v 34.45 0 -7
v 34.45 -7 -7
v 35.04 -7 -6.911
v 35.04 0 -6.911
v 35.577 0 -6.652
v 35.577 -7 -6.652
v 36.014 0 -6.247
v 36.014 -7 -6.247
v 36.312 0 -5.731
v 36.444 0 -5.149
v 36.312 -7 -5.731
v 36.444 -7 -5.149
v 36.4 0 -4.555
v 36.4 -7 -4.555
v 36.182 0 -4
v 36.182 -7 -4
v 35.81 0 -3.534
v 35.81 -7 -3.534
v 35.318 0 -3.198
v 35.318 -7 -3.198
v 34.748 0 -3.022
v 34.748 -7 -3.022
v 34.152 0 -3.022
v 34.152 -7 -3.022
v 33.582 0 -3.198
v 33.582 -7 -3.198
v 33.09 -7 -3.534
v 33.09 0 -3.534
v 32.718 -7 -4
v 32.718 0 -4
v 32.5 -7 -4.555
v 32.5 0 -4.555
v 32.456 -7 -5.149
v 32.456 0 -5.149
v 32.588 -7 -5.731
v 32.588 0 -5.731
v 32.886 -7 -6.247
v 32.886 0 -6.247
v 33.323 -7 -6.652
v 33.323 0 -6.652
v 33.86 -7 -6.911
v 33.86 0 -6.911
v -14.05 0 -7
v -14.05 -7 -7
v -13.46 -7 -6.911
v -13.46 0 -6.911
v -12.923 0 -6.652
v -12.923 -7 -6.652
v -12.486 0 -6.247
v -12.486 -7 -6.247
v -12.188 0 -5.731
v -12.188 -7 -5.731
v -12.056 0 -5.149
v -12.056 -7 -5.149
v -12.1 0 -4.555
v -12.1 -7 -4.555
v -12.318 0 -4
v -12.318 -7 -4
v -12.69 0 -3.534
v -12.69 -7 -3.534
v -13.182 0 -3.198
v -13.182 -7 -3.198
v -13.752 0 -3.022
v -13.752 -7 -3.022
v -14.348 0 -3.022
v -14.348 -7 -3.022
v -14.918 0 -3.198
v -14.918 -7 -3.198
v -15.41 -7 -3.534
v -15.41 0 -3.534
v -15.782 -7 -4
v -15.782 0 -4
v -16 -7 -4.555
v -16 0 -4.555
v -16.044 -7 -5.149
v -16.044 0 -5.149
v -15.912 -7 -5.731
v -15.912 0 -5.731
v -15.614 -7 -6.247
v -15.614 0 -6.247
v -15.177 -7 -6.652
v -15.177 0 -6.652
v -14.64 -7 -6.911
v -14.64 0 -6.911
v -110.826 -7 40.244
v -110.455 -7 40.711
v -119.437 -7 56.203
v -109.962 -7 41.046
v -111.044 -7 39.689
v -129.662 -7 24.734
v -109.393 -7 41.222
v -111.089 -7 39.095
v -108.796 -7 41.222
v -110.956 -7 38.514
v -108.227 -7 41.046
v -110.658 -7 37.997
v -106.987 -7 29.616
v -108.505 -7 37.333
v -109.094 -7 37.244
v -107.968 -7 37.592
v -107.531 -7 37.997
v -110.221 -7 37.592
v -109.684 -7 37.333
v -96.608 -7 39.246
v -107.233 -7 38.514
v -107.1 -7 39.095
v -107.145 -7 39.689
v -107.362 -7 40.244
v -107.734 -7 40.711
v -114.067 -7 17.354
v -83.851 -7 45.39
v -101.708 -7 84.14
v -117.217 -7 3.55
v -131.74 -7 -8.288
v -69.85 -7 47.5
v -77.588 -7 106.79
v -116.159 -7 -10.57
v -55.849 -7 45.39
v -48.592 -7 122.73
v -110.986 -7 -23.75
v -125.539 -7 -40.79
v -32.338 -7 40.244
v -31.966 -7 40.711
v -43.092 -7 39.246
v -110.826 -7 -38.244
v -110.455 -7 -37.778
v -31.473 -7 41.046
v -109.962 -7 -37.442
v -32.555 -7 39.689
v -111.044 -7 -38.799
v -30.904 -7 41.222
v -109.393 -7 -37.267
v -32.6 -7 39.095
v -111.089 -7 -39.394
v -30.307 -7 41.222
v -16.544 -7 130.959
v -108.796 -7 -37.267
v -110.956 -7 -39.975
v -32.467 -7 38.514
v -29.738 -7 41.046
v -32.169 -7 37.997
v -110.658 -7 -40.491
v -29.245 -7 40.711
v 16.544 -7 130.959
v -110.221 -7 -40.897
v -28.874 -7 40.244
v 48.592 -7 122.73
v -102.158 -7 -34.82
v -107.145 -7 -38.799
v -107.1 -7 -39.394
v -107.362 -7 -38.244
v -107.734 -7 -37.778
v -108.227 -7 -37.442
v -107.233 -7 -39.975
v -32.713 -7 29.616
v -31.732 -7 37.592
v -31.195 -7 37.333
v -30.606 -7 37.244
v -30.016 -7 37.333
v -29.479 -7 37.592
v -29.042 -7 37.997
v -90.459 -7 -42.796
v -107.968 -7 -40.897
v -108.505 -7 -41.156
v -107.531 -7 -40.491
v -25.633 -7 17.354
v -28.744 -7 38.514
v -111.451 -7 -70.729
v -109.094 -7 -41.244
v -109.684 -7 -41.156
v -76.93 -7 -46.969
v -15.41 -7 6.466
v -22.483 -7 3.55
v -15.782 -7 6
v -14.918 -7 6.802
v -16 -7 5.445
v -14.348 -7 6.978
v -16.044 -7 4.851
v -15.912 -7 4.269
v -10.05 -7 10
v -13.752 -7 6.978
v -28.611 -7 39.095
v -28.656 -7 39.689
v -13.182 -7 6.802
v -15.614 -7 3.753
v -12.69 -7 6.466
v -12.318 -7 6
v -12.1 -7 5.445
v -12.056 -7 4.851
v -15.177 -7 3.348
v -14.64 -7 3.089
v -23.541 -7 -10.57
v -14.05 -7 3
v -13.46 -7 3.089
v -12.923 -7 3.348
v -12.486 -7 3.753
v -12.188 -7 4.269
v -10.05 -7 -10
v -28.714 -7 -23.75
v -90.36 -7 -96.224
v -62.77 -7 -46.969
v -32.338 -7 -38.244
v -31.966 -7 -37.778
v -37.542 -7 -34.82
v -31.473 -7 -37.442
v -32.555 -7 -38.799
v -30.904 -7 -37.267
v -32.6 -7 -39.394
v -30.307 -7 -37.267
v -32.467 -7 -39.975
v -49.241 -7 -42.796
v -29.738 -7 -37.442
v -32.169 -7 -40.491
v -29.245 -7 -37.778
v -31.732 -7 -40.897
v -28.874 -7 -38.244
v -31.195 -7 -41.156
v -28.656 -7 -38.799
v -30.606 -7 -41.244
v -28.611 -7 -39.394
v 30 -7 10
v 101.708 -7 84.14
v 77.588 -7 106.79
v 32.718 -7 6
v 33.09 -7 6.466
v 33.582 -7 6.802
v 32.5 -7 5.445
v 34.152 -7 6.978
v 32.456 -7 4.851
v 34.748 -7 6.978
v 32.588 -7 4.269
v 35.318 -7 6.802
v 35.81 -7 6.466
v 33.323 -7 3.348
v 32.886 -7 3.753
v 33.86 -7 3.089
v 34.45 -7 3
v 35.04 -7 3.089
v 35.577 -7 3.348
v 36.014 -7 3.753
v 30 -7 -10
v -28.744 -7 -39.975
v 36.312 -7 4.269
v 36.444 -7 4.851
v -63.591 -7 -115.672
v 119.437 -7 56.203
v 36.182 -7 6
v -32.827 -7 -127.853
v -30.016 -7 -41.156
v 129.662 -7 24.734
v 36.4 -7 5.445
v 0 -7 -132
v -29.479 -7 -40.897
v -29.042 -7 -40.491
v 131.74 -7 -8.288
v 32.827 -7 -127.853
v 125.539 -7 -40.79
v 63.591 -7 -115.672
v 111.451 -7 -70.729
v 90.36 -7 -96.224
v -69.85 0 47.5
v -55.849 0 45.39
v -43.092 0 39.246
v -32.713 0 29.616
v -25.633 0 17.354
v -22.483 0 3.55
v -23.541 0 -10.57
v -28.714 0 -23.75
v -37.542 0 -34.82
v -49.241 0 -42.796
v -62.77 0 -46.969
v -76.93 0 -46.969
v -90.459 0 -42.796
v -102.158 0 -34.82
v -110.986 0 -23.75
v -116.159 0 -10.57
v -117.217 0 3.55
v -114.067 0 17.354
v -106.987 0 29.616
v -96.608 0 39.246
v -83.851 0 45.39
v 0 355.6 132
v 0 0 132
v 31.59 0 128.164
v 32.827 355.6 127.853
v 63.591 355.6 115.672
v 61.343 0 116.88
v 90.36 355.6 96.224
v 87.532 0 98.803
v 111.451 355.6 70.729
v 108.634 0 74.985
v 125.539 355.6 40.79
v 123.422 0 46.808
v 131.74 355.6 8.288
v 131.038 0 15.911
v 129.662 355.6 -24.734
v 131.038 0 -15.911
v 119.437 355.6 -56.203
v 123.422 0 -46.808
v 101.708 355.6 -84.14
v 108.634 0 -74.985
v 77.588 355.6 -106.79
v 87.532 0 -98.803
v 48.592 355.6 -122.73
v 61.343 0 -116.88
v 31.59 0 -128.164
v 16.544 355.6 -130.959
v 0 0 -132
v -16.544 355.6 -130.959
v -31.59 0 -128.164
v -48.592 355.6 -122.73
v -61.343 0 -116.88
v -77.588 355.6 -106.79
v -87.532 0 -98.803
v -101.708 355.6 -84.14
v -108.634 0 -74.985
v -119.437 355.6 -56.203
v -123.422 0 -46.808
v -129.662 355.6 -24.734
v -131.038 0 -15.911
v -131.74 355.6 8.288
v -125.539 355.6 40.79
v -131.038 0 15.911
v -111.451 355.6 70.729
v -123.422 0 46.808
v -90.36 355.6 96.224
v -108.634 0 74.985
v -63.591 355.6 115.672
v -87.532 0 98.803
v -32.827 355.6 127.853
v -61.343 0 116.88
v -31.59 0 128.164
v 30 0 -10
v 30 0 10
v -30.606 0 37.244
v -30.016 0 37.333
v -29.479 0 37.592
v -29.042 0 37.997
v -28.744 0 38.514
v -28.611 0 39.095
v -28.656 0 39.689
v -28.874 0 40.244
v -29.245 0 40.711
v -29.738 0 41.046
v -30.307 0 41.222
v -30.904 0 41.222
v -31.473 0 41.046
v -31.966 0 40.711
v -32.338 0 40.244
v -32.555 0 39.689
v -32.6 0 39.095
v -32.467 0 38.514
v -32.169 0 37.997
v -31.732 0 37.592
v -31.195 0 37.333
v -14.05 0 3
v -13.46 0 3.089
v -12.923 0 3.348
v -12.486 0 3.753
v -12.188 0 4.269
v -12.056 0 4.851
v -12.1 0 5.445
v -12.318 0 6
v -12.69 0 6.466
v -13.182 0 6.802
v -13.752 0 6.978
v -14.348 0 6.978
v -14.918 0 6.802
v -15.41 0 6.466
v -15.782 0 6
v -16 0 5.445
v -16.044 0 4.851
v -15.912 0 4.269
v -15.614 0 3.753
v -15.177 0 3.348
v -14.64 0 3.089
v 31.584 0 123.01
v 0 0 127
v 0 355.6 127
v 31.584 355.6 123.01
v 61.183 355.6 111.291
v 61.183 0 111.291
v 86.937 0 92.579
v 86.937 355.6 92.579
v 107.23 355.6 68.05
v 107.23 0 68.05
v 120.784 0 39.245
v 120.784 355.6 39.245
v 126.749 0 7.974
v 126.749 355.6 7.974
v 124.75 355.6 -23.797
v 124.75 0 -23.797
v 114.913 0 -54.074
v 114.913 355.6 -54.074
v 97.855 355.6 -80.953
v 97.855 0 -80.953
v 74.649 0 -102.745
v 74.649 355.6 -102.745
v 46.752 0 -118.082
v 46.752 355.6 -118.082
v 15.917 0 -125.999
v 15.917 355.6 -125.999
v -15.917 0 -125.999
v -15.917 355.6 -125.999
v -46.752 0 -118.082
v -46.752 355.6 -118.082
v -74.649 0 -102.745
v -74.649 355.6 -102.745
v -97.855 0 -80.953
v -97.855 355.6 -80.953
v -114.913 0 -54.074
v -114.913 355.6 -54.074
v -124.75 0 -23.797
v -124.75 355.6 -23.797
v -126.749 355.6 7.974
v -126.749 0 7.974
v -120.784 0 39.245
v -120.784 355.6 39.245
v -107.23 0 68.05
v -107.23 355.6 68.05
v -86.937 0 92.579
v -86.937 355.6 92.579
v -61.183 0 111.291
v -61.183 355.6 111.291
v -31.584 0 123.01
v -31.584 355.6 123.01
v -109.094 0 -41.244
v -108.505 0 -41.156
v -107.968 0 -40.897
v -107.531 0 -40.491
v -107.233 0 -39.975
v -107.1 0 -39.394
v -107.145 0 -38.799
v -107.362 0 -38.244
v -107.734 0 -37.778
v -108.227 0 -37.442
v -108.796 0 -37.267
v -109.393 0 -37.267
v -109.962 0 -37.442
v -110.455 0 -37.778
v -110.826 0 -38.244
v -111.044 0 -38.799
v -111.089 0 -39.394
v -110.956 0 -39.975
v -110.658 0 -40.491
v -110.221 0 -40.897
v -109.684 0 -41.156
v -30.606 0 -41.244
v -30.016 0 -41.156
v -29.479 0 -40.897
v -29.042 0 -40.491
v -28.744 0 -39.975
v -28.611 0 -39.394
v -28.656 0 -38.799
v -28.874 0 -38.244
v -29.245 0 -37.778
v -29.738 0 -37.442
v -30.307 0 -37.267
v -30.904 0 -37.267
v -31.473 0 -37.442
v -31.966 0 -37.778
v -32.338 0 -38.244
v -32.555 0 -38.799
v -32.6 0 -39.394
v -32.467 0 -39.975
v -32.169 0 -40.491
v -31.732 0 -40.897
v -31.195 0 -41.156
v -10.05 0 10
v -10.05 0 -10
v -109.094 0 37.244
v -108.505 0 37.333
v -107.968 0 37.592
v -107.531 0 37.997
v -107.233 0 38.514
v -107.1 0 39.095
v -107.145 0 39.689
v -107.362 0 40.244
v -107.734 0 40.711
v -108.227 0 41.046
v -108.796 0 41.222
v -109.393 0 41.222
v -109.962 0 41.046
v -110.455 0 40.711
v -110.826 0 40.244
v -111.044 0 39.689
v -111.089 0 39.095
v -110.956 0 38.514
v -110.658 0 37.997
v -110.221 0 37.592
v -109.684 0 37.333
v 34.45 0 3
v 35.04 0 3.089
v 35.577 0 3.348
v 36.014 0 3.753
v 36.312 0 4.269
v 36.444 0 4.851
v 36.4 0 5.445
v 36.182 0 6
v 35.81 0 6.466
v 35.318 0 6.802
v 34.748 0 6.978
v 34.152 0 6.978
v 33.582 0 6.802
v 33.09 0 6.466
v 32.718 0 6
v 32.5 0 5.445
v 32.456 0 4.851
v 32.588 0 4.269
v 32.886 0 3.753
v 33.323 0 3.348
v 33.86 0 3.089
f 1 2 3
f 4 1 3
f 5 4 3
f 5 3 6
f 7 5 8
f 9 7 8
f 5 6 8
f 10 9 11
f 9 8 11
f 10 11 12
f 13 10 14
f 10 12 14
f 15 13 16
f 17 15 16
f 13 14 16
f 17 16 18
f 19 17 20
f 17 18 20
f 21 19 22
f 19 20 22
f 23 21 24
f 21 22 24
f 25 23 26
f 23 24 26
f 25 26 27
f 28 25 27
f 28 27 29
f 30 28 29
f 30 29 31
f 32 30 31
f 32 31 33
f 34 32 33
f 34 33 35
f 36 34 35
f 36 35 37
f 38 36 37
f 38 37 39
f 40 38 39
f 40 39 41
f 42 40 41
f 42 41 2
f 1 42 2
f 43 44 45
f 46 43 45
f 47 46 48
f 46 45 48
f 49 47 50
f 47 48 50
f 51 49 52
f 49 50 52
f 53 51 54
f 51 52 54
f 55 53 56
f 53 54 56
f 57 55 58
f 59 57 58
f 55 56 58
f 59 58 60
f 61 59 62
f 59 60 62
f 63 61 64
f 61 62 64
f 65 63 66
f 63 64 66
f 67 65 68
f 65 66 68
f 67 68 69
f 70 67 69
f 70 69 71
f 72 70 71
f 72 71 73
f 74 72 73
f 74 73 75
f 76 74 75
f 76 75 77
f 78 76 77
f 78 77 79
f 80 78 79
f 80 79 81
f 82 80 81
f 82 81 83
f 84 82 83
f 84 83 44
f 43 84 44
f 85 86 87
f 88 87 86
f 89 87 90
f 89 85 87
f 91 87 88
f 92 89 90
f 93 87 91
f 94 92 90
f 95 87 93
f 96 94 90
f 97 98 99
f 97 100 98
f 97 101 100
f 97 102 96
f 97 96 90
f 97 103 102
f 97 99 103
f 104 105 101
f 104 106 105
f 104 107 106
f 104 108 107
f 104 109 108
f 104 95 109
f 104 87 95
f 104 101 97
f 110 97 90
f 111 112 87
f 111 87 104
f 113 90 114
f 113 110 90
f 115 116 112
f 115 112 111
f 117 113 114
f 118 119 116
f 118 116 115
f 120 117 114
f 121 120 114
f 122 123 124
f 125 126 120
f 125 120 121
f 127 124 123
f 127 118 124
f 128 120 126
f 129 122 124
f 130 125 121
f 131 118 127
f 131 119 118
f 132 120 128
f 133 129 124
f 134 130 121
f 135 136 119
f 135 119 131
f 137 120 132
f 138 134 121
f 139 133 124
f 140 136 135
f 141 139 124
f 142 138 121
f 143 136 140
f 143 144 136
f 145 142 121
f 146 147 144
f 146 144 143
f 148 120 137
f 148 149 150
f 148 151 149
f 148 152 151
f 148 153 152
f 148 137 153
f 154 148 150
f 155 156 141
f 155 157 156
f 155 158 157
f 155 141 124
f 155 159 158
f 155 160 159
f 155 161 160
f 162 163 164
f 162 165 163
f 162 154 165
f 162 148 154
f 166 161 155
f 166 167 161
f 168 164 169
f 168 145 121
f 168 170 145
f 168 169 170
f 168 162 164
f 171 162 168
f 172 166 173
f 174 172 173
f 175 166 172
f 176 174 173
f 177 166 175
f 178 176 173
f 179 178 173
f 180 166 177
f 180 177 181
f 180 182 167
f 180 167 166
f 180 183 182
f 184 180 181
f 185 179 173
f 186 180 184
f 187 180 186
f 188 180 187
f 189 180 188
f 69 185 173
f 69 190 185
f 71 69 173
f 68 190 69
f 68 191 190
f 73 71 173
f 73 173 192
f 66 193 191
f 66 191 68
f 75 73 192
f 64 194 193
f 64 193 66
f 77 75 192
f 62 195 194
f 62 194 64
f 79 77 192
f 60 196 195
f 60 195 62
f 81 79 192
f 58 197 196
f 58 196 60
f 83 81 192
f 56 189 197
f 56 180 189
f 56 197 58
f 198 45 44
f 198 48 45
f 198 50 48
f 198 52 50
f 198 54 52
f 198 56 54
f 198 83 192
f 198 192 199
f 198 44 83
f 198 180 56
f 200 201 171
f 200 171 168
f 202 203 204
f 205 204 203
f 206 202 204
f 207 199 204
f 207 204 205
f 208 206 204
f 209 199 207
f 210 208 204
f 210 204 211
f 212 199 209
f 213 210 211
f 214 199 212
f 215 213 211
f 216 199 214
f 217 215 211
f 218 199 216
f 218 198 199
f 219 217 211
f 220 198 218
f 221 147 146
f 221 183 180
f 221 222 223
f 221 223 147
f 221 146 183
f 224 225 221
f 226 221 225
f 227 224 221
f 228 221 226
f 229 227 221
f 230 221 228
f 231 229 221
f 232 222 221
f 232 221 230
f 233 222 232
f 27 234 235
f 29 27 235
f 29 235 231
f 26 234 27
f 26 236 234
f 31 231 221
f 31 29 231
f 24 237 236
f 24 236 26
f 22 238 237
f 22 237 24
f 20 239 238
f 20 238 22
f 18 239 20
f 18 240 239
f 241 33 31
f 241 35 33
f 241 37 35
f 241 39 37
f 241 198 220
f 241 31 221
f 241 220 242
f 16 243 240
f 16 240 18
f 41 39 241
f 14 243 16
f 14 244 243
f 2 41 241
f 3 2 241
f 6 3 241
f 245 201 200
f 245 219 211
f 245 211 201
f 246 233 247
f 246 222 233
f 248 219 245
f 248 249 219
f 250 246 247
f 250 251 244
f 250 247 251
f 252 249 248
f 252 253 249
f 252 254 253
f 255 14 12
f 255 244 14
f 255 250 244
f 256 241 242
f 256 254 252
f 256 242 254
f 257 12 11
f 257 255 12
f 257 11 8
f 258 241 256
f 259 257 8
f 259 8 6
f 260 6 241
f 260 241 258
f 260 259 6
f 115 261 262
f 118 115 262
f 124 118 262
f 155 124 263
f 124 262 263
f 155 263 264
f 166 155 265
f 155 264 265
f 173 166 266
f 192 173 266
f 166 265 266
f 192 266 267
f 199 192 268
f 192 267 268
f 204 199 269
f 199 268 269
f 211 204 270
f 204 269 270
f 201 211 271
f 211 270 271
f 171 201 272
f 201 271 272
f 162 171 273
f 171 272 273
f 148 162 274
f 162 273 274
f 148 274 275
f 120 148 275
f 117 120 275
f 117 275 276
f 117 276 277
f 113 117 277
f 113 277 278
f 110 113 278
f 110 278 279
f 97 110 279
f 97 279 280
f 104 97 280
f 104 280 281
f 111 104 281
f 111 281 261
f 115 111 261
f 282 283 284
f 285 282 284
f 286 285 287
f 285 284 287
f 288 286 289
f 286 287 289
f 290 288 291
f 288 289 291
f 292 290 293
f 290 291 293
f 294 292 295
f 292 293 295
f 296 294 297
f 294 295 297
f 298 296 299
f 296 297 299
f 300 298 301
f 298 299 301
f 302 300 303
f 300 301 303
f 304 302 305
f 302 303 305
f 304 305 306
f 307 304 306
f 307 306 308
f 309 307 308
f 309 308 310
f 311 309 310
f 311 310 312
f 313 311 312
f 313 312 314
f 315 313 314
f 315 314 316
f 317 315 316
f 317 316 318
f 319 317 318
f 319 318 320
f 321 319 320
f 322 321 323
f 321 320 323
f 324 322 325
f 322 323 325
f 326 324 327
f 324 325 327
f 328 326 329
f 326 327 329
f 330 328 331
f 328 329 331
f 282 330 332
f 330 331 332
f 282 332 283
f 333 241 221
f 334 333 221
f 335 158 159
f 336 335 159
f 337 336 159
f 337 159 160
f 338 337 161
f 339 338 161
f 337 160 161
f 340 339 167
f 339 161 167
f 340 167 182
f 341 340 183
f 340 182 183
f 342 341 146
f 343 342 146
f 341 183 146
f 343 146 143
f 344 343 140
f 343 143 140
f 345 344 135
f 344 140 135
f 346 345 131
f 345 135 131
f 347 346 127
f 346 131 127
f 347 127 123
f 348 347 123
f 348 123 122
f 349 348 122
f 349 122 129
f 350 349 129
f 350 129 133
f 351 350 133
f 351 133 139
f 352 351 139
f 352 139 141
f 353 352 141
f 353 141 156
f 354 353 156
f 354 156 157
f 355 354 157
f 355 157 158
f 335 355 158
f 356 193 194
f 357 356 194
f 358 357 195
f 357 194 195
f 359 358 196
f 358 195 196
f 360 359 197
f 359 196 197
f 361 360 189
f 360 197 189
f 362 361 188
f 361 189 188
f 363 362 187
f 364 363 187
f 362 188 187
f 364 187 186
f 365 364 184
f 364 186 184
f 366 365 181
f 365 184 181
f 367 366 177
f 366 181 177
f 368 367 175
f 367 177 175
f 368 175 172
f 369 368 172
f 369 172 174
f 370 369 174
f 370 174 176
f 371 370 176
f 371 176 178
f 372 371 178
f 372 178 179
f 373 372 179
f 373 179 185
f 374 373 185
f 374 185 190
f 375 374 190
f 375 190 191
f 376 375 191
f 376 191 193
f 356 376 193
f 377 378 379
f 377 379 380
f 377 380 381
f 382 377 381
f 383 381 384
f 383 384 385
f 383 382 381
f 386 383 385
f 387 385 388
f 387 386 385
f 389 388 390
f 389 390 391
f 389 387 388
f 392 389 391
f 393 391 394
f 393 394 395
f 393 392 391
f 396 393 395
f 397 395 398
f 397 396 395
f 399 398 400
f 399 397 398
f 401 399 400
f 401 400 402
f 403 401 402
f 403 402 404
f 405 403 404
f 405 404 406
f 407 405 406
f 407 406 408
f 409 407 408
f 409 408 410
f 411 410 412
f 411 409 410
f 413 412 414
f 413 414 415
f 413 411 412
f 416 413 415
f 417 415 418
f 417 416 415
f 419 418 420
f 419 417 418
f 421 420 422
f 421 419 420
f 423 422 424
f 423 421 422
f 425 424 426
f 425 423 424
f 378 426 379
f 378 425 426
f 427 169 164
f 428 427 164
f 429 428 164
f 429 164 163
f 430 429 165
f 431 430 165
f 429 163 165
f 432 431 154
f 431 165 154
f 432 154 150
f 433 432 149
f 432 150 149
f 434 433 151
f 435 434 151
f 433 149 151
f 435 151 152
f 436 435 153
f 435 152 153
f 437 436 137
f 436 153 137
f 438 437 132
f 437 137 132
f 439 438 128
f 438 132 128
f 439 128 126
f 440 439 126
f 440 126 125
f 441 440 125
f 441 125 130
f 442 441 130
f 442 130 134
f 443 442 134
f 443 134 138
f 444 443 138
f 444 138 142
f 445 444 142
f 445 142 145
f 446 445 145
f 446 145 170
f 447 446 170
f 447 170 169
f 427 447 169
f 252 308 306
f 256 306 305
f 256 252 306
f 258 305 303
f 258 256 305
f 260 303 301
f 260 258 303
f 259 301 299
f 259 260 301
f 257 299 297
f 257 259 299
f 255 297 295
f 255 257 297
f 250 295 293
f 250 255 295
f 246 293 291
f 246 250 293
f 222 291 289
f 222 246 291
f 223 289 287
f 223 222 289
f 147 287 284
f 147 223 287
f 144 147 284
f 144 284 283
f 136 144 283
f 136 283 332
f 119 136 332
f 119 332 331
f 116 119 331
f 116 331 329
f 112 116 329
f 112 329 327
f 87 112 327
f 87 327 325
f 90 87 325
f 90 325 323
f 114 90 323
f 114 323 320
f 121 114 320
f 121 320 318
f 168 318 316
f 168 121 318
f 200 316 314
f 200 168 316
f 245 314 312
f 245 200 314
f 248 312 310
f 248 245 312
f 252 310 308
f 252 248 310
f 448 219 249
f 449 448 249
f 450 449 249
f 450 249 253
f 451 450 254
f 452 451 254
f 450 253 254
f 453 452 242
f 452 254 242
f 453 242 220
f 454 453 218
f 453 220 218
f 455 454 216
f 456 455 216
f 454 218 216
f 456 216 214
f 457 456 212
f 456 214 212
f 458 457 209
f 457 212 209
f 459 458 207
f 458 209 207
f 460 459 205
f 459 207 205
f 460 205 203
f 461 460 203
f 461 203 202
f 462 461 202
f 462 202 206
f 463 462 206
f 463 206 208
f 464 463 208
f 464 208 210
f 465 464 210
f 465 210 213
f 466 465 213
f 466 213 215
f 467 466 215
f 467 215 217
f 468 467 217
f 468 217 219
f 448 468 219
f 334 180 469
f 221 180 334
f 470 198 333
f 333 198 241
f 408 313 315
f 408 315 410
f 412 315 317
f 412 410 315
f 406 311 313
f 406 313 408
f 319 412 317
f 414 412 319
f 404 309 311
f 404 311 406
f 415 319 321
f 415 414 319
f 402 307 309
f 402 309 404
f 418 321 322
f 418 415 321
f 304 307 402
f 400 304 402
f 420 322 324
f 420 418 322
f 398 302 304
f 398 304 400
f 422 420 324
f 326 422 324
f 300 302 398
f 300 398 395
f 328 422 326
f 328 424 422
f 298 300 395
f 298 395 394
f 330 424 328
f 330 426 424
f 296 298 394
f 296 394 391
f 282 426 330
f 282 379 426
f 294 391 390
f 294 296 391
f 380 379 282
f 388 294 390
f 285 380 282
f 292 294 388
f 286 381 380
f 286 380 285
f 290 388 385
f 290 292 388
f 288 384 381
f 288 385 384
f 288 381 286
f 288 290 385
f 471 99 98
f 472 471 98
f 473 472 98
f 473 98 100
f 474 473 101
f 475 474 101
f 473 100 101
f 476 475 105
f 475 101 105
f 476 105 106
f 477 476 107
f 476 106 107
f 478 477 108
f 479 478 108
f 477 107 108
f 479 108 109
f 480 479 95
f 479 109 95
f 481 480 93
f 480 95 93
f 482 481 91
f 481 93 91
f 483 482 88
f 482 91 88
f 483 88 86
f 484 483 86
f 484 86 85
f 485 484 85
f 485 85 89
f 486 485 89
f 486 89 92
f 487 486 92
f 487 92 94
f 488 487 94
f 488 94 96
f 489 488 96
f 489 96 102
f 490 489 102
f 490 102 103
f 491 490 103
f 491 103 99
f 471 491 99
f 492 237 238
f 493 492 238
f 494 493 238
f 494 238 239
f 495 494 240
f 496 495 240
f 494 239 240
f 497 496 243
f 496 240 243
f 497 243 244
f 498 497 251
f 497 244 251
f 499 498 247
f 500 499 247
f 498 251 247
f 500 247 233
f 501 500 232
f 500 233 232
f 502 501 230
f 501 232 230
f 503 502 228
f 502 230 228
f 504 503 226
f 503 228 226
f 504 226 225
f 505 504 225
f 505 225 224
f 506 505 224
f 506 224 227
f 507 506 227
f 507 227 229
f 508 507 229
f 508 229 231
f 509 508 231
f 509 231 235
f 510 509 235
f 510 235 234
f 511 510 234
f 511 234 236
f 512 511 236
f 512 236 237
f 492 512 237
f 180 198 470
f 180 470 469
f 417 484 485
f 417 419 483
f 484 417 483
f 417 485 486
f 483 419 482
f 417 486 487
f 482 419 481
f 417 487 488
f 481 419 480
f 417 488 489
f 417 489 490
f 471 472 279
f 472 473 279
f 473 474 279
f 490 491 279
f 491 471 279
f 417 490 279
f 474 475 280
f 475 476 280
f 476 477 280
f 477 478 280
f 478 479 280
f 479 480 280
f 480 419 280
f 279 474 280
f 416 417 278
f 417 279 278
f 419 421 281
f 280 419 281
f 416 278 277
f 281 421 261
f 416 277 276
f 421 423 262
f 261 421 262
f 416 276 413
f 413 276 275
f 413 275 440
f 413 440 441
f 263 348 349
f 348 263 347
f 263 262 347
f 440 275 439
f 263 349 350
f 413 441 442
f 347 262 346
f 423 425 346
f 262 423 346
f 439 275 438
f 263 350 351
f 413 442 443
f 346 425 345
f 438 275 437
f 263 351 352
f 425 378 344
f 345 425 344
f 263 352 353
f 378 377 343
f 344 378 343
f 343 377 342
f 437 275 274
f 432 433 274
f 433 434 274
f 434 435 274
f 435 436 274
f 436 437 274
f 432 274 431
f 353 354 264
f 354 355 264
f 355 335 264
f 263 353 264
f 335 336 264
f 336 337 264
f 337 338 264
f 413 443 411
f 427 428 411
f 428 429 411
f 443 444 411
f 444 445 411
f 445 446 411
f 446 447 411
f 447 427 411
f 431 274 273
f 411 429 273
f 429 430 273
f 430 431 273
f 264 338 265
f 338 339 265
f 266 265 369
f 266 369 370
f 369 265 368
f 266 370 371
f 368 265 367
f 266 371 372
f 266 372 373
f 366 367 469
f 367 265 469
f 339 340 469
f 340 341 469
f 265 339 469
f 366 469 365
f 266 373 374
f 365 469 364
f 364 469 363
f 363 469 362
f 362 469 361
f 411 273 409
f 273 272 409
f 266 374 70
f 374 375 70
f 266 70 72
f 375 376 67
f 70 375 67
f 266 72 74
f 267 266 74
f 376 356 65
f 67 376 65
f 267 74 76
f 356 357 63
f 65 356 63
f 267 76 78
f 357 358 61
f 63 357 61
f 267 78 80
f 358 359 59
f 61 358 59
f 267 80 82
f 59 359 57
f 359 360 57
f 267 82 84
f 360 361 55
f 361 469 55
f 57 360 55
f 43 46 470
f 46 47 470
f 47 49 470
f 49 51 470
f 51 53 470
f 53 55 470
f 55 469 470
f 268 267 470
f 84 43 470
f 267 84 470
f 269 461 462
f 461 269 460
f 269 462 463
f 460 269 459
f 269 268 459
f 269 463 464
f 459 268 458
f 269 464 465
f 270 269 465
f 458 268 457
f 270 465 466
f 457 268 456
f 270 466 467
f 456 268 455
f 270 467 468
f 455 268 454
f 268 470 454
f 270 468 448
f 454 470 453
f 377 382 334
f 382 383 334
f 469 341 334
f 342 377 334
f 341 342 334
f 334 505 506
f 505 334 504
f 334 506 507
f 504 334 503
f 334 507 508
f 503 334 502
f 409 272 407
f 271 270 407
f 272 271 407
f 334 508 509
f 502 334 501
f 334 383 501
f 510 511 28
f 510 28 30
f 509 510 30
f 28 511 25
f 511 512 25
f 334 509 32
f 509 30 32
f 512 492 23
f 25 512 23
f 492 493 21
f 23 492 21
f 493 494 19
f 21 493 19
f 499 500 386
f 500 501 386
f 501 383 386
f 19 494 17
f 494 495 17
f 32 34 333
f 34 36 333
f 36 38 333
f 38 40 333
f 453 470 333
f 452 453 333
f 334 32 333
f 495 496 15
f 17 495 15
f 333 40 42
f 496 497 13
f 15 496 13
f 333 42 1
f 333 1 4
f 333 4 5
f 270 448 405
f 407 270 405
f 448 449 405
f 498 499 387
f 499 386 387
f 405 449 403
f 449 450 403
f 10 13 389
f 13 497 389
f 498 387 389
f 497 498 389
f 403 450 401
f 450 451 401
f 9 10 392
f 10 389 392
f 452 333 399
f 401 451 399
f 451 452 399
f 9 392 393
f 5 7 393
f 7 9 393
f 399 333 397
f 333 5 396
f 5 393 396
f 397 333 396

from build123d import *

# Parameters (mm, degrees)
SKETCH1_R           = 132
SKETCH1_R_2         = 127
BOSS_EXTRUDE1_DEPTH = 355.6
BOSS_EXTRUDE2_START = 7
SKETCH2_R           = 132
BOSS_EXTRUDE2_DEPTH = 7
SKETCH3_R           = 2
SKETCH3_W           = 40.05
SKETCH3_H           = 20
CUT_EXTRUDE1_DEPTH  = 408.831779046
SKETCH4_R           = 47.5
CUT_EXTRUDE2_DEPTH  = 402.62091579
SKETCH5_R           = 2
CUT_EXTRUDE3_DEPTH  = 408.831779046


with BuildPart() as part:
    # Sketch1 → Boss-Extrude1 (new body)
    with BuildSketch(Plane(origin=(0, 0, 0), x_dir=(1, 0, 0), z_dir=(0, 1, 0))):
        with Locations(Location((0, 0, 0), (0, 0, 270))):
            Circle(SKETCH1_R)
        with Locations(Location((0, 0, 0), (0, 0, 270))):
            Circle(SKETCH1_R_2, mode=Mode.SUBTRACT)
    extrude(amount=BOSS_EXTRUDE1_DEPTH)

    # Sketch2 → Boss-Extrude2 (add)
    with BuildSketch(Plane.XZ.offset(BOSS_EXTRUDE2_START)):
        with Locations(Location((0, 0, 0), (0, 0, 270))):
            Circle(SKETCH2_R)
    extrude(amount=-BOSS_EXTRUDE2_DEPTH)

    # Sketch3 → Cut-Extrude1 (cut, through all)
    with BuildSketch(Plane.XZ.offset(7)):
        with Locations(Location((-14.05, 5, 0), (0, 0, 270))):
            Circle(SKETCH3_R)
        with Locations(Location((-14.05, -5, 0), (0, 0, 270))):
            Circle(SKETCH3_R)
        with Locations(Location((34.45, 5, 0), (0, 0, 270))):
            Circle(SKETCH3_R)
        with Locations(Location((34.45, -5, 0), (0, 0, 270))):
            Circle(SKETCH3_R)
        with Locations((9.975, 0)):
            Rectangle(SKETCH3_W, SKETCH3_H)
    extrude(amount=-CUT_EXTRUDE1_DEPTH, mode=Mode.SUBTRACT)

    # Sketch4 → Cut-Extrude2 (cut, through all)
    with BuildSketch(Plane(origin=(0, 0, 0), x_dir=(1, 0, 0), z_dir=(0, 1, 0))):
        with Locations(Location((-69.85, 0, 0), (0, 0, 270))):
            Circle(SKETCH4_R)
    extrude(amount=-CUT_EXTRUDE2_DEPTH, mode=Mode.SUBTRACT)

    # Sketch5 → Cut-Extrude3 (cut, through all)
    with BuildSketch(Plane.XZ.offset(7)):
        with Locations(Location((-30.605573644, 39.244426356, 0), (0, 0, 270))):
            Circle(SKETCH5_R)
        with Locations(Location((-30.605573644, -39.244426356, 0), (0, 0, 270))):
            Circle(SKETCH5_R)
        with Locations(Location((-109.094426356, 39.244426356, 0), (0, 0, 270))):
            Circle(SKETCH5_R)
        with Locations(Location((-109.094426356, -39.244426356, 0), (0, 0, 270))):
            Circle(SKETCH5_R)
    extrude(amount=-CUT_EXTRUDE3_DEPTH, mode=Mode.SUBTRACT)


solid = part.part
